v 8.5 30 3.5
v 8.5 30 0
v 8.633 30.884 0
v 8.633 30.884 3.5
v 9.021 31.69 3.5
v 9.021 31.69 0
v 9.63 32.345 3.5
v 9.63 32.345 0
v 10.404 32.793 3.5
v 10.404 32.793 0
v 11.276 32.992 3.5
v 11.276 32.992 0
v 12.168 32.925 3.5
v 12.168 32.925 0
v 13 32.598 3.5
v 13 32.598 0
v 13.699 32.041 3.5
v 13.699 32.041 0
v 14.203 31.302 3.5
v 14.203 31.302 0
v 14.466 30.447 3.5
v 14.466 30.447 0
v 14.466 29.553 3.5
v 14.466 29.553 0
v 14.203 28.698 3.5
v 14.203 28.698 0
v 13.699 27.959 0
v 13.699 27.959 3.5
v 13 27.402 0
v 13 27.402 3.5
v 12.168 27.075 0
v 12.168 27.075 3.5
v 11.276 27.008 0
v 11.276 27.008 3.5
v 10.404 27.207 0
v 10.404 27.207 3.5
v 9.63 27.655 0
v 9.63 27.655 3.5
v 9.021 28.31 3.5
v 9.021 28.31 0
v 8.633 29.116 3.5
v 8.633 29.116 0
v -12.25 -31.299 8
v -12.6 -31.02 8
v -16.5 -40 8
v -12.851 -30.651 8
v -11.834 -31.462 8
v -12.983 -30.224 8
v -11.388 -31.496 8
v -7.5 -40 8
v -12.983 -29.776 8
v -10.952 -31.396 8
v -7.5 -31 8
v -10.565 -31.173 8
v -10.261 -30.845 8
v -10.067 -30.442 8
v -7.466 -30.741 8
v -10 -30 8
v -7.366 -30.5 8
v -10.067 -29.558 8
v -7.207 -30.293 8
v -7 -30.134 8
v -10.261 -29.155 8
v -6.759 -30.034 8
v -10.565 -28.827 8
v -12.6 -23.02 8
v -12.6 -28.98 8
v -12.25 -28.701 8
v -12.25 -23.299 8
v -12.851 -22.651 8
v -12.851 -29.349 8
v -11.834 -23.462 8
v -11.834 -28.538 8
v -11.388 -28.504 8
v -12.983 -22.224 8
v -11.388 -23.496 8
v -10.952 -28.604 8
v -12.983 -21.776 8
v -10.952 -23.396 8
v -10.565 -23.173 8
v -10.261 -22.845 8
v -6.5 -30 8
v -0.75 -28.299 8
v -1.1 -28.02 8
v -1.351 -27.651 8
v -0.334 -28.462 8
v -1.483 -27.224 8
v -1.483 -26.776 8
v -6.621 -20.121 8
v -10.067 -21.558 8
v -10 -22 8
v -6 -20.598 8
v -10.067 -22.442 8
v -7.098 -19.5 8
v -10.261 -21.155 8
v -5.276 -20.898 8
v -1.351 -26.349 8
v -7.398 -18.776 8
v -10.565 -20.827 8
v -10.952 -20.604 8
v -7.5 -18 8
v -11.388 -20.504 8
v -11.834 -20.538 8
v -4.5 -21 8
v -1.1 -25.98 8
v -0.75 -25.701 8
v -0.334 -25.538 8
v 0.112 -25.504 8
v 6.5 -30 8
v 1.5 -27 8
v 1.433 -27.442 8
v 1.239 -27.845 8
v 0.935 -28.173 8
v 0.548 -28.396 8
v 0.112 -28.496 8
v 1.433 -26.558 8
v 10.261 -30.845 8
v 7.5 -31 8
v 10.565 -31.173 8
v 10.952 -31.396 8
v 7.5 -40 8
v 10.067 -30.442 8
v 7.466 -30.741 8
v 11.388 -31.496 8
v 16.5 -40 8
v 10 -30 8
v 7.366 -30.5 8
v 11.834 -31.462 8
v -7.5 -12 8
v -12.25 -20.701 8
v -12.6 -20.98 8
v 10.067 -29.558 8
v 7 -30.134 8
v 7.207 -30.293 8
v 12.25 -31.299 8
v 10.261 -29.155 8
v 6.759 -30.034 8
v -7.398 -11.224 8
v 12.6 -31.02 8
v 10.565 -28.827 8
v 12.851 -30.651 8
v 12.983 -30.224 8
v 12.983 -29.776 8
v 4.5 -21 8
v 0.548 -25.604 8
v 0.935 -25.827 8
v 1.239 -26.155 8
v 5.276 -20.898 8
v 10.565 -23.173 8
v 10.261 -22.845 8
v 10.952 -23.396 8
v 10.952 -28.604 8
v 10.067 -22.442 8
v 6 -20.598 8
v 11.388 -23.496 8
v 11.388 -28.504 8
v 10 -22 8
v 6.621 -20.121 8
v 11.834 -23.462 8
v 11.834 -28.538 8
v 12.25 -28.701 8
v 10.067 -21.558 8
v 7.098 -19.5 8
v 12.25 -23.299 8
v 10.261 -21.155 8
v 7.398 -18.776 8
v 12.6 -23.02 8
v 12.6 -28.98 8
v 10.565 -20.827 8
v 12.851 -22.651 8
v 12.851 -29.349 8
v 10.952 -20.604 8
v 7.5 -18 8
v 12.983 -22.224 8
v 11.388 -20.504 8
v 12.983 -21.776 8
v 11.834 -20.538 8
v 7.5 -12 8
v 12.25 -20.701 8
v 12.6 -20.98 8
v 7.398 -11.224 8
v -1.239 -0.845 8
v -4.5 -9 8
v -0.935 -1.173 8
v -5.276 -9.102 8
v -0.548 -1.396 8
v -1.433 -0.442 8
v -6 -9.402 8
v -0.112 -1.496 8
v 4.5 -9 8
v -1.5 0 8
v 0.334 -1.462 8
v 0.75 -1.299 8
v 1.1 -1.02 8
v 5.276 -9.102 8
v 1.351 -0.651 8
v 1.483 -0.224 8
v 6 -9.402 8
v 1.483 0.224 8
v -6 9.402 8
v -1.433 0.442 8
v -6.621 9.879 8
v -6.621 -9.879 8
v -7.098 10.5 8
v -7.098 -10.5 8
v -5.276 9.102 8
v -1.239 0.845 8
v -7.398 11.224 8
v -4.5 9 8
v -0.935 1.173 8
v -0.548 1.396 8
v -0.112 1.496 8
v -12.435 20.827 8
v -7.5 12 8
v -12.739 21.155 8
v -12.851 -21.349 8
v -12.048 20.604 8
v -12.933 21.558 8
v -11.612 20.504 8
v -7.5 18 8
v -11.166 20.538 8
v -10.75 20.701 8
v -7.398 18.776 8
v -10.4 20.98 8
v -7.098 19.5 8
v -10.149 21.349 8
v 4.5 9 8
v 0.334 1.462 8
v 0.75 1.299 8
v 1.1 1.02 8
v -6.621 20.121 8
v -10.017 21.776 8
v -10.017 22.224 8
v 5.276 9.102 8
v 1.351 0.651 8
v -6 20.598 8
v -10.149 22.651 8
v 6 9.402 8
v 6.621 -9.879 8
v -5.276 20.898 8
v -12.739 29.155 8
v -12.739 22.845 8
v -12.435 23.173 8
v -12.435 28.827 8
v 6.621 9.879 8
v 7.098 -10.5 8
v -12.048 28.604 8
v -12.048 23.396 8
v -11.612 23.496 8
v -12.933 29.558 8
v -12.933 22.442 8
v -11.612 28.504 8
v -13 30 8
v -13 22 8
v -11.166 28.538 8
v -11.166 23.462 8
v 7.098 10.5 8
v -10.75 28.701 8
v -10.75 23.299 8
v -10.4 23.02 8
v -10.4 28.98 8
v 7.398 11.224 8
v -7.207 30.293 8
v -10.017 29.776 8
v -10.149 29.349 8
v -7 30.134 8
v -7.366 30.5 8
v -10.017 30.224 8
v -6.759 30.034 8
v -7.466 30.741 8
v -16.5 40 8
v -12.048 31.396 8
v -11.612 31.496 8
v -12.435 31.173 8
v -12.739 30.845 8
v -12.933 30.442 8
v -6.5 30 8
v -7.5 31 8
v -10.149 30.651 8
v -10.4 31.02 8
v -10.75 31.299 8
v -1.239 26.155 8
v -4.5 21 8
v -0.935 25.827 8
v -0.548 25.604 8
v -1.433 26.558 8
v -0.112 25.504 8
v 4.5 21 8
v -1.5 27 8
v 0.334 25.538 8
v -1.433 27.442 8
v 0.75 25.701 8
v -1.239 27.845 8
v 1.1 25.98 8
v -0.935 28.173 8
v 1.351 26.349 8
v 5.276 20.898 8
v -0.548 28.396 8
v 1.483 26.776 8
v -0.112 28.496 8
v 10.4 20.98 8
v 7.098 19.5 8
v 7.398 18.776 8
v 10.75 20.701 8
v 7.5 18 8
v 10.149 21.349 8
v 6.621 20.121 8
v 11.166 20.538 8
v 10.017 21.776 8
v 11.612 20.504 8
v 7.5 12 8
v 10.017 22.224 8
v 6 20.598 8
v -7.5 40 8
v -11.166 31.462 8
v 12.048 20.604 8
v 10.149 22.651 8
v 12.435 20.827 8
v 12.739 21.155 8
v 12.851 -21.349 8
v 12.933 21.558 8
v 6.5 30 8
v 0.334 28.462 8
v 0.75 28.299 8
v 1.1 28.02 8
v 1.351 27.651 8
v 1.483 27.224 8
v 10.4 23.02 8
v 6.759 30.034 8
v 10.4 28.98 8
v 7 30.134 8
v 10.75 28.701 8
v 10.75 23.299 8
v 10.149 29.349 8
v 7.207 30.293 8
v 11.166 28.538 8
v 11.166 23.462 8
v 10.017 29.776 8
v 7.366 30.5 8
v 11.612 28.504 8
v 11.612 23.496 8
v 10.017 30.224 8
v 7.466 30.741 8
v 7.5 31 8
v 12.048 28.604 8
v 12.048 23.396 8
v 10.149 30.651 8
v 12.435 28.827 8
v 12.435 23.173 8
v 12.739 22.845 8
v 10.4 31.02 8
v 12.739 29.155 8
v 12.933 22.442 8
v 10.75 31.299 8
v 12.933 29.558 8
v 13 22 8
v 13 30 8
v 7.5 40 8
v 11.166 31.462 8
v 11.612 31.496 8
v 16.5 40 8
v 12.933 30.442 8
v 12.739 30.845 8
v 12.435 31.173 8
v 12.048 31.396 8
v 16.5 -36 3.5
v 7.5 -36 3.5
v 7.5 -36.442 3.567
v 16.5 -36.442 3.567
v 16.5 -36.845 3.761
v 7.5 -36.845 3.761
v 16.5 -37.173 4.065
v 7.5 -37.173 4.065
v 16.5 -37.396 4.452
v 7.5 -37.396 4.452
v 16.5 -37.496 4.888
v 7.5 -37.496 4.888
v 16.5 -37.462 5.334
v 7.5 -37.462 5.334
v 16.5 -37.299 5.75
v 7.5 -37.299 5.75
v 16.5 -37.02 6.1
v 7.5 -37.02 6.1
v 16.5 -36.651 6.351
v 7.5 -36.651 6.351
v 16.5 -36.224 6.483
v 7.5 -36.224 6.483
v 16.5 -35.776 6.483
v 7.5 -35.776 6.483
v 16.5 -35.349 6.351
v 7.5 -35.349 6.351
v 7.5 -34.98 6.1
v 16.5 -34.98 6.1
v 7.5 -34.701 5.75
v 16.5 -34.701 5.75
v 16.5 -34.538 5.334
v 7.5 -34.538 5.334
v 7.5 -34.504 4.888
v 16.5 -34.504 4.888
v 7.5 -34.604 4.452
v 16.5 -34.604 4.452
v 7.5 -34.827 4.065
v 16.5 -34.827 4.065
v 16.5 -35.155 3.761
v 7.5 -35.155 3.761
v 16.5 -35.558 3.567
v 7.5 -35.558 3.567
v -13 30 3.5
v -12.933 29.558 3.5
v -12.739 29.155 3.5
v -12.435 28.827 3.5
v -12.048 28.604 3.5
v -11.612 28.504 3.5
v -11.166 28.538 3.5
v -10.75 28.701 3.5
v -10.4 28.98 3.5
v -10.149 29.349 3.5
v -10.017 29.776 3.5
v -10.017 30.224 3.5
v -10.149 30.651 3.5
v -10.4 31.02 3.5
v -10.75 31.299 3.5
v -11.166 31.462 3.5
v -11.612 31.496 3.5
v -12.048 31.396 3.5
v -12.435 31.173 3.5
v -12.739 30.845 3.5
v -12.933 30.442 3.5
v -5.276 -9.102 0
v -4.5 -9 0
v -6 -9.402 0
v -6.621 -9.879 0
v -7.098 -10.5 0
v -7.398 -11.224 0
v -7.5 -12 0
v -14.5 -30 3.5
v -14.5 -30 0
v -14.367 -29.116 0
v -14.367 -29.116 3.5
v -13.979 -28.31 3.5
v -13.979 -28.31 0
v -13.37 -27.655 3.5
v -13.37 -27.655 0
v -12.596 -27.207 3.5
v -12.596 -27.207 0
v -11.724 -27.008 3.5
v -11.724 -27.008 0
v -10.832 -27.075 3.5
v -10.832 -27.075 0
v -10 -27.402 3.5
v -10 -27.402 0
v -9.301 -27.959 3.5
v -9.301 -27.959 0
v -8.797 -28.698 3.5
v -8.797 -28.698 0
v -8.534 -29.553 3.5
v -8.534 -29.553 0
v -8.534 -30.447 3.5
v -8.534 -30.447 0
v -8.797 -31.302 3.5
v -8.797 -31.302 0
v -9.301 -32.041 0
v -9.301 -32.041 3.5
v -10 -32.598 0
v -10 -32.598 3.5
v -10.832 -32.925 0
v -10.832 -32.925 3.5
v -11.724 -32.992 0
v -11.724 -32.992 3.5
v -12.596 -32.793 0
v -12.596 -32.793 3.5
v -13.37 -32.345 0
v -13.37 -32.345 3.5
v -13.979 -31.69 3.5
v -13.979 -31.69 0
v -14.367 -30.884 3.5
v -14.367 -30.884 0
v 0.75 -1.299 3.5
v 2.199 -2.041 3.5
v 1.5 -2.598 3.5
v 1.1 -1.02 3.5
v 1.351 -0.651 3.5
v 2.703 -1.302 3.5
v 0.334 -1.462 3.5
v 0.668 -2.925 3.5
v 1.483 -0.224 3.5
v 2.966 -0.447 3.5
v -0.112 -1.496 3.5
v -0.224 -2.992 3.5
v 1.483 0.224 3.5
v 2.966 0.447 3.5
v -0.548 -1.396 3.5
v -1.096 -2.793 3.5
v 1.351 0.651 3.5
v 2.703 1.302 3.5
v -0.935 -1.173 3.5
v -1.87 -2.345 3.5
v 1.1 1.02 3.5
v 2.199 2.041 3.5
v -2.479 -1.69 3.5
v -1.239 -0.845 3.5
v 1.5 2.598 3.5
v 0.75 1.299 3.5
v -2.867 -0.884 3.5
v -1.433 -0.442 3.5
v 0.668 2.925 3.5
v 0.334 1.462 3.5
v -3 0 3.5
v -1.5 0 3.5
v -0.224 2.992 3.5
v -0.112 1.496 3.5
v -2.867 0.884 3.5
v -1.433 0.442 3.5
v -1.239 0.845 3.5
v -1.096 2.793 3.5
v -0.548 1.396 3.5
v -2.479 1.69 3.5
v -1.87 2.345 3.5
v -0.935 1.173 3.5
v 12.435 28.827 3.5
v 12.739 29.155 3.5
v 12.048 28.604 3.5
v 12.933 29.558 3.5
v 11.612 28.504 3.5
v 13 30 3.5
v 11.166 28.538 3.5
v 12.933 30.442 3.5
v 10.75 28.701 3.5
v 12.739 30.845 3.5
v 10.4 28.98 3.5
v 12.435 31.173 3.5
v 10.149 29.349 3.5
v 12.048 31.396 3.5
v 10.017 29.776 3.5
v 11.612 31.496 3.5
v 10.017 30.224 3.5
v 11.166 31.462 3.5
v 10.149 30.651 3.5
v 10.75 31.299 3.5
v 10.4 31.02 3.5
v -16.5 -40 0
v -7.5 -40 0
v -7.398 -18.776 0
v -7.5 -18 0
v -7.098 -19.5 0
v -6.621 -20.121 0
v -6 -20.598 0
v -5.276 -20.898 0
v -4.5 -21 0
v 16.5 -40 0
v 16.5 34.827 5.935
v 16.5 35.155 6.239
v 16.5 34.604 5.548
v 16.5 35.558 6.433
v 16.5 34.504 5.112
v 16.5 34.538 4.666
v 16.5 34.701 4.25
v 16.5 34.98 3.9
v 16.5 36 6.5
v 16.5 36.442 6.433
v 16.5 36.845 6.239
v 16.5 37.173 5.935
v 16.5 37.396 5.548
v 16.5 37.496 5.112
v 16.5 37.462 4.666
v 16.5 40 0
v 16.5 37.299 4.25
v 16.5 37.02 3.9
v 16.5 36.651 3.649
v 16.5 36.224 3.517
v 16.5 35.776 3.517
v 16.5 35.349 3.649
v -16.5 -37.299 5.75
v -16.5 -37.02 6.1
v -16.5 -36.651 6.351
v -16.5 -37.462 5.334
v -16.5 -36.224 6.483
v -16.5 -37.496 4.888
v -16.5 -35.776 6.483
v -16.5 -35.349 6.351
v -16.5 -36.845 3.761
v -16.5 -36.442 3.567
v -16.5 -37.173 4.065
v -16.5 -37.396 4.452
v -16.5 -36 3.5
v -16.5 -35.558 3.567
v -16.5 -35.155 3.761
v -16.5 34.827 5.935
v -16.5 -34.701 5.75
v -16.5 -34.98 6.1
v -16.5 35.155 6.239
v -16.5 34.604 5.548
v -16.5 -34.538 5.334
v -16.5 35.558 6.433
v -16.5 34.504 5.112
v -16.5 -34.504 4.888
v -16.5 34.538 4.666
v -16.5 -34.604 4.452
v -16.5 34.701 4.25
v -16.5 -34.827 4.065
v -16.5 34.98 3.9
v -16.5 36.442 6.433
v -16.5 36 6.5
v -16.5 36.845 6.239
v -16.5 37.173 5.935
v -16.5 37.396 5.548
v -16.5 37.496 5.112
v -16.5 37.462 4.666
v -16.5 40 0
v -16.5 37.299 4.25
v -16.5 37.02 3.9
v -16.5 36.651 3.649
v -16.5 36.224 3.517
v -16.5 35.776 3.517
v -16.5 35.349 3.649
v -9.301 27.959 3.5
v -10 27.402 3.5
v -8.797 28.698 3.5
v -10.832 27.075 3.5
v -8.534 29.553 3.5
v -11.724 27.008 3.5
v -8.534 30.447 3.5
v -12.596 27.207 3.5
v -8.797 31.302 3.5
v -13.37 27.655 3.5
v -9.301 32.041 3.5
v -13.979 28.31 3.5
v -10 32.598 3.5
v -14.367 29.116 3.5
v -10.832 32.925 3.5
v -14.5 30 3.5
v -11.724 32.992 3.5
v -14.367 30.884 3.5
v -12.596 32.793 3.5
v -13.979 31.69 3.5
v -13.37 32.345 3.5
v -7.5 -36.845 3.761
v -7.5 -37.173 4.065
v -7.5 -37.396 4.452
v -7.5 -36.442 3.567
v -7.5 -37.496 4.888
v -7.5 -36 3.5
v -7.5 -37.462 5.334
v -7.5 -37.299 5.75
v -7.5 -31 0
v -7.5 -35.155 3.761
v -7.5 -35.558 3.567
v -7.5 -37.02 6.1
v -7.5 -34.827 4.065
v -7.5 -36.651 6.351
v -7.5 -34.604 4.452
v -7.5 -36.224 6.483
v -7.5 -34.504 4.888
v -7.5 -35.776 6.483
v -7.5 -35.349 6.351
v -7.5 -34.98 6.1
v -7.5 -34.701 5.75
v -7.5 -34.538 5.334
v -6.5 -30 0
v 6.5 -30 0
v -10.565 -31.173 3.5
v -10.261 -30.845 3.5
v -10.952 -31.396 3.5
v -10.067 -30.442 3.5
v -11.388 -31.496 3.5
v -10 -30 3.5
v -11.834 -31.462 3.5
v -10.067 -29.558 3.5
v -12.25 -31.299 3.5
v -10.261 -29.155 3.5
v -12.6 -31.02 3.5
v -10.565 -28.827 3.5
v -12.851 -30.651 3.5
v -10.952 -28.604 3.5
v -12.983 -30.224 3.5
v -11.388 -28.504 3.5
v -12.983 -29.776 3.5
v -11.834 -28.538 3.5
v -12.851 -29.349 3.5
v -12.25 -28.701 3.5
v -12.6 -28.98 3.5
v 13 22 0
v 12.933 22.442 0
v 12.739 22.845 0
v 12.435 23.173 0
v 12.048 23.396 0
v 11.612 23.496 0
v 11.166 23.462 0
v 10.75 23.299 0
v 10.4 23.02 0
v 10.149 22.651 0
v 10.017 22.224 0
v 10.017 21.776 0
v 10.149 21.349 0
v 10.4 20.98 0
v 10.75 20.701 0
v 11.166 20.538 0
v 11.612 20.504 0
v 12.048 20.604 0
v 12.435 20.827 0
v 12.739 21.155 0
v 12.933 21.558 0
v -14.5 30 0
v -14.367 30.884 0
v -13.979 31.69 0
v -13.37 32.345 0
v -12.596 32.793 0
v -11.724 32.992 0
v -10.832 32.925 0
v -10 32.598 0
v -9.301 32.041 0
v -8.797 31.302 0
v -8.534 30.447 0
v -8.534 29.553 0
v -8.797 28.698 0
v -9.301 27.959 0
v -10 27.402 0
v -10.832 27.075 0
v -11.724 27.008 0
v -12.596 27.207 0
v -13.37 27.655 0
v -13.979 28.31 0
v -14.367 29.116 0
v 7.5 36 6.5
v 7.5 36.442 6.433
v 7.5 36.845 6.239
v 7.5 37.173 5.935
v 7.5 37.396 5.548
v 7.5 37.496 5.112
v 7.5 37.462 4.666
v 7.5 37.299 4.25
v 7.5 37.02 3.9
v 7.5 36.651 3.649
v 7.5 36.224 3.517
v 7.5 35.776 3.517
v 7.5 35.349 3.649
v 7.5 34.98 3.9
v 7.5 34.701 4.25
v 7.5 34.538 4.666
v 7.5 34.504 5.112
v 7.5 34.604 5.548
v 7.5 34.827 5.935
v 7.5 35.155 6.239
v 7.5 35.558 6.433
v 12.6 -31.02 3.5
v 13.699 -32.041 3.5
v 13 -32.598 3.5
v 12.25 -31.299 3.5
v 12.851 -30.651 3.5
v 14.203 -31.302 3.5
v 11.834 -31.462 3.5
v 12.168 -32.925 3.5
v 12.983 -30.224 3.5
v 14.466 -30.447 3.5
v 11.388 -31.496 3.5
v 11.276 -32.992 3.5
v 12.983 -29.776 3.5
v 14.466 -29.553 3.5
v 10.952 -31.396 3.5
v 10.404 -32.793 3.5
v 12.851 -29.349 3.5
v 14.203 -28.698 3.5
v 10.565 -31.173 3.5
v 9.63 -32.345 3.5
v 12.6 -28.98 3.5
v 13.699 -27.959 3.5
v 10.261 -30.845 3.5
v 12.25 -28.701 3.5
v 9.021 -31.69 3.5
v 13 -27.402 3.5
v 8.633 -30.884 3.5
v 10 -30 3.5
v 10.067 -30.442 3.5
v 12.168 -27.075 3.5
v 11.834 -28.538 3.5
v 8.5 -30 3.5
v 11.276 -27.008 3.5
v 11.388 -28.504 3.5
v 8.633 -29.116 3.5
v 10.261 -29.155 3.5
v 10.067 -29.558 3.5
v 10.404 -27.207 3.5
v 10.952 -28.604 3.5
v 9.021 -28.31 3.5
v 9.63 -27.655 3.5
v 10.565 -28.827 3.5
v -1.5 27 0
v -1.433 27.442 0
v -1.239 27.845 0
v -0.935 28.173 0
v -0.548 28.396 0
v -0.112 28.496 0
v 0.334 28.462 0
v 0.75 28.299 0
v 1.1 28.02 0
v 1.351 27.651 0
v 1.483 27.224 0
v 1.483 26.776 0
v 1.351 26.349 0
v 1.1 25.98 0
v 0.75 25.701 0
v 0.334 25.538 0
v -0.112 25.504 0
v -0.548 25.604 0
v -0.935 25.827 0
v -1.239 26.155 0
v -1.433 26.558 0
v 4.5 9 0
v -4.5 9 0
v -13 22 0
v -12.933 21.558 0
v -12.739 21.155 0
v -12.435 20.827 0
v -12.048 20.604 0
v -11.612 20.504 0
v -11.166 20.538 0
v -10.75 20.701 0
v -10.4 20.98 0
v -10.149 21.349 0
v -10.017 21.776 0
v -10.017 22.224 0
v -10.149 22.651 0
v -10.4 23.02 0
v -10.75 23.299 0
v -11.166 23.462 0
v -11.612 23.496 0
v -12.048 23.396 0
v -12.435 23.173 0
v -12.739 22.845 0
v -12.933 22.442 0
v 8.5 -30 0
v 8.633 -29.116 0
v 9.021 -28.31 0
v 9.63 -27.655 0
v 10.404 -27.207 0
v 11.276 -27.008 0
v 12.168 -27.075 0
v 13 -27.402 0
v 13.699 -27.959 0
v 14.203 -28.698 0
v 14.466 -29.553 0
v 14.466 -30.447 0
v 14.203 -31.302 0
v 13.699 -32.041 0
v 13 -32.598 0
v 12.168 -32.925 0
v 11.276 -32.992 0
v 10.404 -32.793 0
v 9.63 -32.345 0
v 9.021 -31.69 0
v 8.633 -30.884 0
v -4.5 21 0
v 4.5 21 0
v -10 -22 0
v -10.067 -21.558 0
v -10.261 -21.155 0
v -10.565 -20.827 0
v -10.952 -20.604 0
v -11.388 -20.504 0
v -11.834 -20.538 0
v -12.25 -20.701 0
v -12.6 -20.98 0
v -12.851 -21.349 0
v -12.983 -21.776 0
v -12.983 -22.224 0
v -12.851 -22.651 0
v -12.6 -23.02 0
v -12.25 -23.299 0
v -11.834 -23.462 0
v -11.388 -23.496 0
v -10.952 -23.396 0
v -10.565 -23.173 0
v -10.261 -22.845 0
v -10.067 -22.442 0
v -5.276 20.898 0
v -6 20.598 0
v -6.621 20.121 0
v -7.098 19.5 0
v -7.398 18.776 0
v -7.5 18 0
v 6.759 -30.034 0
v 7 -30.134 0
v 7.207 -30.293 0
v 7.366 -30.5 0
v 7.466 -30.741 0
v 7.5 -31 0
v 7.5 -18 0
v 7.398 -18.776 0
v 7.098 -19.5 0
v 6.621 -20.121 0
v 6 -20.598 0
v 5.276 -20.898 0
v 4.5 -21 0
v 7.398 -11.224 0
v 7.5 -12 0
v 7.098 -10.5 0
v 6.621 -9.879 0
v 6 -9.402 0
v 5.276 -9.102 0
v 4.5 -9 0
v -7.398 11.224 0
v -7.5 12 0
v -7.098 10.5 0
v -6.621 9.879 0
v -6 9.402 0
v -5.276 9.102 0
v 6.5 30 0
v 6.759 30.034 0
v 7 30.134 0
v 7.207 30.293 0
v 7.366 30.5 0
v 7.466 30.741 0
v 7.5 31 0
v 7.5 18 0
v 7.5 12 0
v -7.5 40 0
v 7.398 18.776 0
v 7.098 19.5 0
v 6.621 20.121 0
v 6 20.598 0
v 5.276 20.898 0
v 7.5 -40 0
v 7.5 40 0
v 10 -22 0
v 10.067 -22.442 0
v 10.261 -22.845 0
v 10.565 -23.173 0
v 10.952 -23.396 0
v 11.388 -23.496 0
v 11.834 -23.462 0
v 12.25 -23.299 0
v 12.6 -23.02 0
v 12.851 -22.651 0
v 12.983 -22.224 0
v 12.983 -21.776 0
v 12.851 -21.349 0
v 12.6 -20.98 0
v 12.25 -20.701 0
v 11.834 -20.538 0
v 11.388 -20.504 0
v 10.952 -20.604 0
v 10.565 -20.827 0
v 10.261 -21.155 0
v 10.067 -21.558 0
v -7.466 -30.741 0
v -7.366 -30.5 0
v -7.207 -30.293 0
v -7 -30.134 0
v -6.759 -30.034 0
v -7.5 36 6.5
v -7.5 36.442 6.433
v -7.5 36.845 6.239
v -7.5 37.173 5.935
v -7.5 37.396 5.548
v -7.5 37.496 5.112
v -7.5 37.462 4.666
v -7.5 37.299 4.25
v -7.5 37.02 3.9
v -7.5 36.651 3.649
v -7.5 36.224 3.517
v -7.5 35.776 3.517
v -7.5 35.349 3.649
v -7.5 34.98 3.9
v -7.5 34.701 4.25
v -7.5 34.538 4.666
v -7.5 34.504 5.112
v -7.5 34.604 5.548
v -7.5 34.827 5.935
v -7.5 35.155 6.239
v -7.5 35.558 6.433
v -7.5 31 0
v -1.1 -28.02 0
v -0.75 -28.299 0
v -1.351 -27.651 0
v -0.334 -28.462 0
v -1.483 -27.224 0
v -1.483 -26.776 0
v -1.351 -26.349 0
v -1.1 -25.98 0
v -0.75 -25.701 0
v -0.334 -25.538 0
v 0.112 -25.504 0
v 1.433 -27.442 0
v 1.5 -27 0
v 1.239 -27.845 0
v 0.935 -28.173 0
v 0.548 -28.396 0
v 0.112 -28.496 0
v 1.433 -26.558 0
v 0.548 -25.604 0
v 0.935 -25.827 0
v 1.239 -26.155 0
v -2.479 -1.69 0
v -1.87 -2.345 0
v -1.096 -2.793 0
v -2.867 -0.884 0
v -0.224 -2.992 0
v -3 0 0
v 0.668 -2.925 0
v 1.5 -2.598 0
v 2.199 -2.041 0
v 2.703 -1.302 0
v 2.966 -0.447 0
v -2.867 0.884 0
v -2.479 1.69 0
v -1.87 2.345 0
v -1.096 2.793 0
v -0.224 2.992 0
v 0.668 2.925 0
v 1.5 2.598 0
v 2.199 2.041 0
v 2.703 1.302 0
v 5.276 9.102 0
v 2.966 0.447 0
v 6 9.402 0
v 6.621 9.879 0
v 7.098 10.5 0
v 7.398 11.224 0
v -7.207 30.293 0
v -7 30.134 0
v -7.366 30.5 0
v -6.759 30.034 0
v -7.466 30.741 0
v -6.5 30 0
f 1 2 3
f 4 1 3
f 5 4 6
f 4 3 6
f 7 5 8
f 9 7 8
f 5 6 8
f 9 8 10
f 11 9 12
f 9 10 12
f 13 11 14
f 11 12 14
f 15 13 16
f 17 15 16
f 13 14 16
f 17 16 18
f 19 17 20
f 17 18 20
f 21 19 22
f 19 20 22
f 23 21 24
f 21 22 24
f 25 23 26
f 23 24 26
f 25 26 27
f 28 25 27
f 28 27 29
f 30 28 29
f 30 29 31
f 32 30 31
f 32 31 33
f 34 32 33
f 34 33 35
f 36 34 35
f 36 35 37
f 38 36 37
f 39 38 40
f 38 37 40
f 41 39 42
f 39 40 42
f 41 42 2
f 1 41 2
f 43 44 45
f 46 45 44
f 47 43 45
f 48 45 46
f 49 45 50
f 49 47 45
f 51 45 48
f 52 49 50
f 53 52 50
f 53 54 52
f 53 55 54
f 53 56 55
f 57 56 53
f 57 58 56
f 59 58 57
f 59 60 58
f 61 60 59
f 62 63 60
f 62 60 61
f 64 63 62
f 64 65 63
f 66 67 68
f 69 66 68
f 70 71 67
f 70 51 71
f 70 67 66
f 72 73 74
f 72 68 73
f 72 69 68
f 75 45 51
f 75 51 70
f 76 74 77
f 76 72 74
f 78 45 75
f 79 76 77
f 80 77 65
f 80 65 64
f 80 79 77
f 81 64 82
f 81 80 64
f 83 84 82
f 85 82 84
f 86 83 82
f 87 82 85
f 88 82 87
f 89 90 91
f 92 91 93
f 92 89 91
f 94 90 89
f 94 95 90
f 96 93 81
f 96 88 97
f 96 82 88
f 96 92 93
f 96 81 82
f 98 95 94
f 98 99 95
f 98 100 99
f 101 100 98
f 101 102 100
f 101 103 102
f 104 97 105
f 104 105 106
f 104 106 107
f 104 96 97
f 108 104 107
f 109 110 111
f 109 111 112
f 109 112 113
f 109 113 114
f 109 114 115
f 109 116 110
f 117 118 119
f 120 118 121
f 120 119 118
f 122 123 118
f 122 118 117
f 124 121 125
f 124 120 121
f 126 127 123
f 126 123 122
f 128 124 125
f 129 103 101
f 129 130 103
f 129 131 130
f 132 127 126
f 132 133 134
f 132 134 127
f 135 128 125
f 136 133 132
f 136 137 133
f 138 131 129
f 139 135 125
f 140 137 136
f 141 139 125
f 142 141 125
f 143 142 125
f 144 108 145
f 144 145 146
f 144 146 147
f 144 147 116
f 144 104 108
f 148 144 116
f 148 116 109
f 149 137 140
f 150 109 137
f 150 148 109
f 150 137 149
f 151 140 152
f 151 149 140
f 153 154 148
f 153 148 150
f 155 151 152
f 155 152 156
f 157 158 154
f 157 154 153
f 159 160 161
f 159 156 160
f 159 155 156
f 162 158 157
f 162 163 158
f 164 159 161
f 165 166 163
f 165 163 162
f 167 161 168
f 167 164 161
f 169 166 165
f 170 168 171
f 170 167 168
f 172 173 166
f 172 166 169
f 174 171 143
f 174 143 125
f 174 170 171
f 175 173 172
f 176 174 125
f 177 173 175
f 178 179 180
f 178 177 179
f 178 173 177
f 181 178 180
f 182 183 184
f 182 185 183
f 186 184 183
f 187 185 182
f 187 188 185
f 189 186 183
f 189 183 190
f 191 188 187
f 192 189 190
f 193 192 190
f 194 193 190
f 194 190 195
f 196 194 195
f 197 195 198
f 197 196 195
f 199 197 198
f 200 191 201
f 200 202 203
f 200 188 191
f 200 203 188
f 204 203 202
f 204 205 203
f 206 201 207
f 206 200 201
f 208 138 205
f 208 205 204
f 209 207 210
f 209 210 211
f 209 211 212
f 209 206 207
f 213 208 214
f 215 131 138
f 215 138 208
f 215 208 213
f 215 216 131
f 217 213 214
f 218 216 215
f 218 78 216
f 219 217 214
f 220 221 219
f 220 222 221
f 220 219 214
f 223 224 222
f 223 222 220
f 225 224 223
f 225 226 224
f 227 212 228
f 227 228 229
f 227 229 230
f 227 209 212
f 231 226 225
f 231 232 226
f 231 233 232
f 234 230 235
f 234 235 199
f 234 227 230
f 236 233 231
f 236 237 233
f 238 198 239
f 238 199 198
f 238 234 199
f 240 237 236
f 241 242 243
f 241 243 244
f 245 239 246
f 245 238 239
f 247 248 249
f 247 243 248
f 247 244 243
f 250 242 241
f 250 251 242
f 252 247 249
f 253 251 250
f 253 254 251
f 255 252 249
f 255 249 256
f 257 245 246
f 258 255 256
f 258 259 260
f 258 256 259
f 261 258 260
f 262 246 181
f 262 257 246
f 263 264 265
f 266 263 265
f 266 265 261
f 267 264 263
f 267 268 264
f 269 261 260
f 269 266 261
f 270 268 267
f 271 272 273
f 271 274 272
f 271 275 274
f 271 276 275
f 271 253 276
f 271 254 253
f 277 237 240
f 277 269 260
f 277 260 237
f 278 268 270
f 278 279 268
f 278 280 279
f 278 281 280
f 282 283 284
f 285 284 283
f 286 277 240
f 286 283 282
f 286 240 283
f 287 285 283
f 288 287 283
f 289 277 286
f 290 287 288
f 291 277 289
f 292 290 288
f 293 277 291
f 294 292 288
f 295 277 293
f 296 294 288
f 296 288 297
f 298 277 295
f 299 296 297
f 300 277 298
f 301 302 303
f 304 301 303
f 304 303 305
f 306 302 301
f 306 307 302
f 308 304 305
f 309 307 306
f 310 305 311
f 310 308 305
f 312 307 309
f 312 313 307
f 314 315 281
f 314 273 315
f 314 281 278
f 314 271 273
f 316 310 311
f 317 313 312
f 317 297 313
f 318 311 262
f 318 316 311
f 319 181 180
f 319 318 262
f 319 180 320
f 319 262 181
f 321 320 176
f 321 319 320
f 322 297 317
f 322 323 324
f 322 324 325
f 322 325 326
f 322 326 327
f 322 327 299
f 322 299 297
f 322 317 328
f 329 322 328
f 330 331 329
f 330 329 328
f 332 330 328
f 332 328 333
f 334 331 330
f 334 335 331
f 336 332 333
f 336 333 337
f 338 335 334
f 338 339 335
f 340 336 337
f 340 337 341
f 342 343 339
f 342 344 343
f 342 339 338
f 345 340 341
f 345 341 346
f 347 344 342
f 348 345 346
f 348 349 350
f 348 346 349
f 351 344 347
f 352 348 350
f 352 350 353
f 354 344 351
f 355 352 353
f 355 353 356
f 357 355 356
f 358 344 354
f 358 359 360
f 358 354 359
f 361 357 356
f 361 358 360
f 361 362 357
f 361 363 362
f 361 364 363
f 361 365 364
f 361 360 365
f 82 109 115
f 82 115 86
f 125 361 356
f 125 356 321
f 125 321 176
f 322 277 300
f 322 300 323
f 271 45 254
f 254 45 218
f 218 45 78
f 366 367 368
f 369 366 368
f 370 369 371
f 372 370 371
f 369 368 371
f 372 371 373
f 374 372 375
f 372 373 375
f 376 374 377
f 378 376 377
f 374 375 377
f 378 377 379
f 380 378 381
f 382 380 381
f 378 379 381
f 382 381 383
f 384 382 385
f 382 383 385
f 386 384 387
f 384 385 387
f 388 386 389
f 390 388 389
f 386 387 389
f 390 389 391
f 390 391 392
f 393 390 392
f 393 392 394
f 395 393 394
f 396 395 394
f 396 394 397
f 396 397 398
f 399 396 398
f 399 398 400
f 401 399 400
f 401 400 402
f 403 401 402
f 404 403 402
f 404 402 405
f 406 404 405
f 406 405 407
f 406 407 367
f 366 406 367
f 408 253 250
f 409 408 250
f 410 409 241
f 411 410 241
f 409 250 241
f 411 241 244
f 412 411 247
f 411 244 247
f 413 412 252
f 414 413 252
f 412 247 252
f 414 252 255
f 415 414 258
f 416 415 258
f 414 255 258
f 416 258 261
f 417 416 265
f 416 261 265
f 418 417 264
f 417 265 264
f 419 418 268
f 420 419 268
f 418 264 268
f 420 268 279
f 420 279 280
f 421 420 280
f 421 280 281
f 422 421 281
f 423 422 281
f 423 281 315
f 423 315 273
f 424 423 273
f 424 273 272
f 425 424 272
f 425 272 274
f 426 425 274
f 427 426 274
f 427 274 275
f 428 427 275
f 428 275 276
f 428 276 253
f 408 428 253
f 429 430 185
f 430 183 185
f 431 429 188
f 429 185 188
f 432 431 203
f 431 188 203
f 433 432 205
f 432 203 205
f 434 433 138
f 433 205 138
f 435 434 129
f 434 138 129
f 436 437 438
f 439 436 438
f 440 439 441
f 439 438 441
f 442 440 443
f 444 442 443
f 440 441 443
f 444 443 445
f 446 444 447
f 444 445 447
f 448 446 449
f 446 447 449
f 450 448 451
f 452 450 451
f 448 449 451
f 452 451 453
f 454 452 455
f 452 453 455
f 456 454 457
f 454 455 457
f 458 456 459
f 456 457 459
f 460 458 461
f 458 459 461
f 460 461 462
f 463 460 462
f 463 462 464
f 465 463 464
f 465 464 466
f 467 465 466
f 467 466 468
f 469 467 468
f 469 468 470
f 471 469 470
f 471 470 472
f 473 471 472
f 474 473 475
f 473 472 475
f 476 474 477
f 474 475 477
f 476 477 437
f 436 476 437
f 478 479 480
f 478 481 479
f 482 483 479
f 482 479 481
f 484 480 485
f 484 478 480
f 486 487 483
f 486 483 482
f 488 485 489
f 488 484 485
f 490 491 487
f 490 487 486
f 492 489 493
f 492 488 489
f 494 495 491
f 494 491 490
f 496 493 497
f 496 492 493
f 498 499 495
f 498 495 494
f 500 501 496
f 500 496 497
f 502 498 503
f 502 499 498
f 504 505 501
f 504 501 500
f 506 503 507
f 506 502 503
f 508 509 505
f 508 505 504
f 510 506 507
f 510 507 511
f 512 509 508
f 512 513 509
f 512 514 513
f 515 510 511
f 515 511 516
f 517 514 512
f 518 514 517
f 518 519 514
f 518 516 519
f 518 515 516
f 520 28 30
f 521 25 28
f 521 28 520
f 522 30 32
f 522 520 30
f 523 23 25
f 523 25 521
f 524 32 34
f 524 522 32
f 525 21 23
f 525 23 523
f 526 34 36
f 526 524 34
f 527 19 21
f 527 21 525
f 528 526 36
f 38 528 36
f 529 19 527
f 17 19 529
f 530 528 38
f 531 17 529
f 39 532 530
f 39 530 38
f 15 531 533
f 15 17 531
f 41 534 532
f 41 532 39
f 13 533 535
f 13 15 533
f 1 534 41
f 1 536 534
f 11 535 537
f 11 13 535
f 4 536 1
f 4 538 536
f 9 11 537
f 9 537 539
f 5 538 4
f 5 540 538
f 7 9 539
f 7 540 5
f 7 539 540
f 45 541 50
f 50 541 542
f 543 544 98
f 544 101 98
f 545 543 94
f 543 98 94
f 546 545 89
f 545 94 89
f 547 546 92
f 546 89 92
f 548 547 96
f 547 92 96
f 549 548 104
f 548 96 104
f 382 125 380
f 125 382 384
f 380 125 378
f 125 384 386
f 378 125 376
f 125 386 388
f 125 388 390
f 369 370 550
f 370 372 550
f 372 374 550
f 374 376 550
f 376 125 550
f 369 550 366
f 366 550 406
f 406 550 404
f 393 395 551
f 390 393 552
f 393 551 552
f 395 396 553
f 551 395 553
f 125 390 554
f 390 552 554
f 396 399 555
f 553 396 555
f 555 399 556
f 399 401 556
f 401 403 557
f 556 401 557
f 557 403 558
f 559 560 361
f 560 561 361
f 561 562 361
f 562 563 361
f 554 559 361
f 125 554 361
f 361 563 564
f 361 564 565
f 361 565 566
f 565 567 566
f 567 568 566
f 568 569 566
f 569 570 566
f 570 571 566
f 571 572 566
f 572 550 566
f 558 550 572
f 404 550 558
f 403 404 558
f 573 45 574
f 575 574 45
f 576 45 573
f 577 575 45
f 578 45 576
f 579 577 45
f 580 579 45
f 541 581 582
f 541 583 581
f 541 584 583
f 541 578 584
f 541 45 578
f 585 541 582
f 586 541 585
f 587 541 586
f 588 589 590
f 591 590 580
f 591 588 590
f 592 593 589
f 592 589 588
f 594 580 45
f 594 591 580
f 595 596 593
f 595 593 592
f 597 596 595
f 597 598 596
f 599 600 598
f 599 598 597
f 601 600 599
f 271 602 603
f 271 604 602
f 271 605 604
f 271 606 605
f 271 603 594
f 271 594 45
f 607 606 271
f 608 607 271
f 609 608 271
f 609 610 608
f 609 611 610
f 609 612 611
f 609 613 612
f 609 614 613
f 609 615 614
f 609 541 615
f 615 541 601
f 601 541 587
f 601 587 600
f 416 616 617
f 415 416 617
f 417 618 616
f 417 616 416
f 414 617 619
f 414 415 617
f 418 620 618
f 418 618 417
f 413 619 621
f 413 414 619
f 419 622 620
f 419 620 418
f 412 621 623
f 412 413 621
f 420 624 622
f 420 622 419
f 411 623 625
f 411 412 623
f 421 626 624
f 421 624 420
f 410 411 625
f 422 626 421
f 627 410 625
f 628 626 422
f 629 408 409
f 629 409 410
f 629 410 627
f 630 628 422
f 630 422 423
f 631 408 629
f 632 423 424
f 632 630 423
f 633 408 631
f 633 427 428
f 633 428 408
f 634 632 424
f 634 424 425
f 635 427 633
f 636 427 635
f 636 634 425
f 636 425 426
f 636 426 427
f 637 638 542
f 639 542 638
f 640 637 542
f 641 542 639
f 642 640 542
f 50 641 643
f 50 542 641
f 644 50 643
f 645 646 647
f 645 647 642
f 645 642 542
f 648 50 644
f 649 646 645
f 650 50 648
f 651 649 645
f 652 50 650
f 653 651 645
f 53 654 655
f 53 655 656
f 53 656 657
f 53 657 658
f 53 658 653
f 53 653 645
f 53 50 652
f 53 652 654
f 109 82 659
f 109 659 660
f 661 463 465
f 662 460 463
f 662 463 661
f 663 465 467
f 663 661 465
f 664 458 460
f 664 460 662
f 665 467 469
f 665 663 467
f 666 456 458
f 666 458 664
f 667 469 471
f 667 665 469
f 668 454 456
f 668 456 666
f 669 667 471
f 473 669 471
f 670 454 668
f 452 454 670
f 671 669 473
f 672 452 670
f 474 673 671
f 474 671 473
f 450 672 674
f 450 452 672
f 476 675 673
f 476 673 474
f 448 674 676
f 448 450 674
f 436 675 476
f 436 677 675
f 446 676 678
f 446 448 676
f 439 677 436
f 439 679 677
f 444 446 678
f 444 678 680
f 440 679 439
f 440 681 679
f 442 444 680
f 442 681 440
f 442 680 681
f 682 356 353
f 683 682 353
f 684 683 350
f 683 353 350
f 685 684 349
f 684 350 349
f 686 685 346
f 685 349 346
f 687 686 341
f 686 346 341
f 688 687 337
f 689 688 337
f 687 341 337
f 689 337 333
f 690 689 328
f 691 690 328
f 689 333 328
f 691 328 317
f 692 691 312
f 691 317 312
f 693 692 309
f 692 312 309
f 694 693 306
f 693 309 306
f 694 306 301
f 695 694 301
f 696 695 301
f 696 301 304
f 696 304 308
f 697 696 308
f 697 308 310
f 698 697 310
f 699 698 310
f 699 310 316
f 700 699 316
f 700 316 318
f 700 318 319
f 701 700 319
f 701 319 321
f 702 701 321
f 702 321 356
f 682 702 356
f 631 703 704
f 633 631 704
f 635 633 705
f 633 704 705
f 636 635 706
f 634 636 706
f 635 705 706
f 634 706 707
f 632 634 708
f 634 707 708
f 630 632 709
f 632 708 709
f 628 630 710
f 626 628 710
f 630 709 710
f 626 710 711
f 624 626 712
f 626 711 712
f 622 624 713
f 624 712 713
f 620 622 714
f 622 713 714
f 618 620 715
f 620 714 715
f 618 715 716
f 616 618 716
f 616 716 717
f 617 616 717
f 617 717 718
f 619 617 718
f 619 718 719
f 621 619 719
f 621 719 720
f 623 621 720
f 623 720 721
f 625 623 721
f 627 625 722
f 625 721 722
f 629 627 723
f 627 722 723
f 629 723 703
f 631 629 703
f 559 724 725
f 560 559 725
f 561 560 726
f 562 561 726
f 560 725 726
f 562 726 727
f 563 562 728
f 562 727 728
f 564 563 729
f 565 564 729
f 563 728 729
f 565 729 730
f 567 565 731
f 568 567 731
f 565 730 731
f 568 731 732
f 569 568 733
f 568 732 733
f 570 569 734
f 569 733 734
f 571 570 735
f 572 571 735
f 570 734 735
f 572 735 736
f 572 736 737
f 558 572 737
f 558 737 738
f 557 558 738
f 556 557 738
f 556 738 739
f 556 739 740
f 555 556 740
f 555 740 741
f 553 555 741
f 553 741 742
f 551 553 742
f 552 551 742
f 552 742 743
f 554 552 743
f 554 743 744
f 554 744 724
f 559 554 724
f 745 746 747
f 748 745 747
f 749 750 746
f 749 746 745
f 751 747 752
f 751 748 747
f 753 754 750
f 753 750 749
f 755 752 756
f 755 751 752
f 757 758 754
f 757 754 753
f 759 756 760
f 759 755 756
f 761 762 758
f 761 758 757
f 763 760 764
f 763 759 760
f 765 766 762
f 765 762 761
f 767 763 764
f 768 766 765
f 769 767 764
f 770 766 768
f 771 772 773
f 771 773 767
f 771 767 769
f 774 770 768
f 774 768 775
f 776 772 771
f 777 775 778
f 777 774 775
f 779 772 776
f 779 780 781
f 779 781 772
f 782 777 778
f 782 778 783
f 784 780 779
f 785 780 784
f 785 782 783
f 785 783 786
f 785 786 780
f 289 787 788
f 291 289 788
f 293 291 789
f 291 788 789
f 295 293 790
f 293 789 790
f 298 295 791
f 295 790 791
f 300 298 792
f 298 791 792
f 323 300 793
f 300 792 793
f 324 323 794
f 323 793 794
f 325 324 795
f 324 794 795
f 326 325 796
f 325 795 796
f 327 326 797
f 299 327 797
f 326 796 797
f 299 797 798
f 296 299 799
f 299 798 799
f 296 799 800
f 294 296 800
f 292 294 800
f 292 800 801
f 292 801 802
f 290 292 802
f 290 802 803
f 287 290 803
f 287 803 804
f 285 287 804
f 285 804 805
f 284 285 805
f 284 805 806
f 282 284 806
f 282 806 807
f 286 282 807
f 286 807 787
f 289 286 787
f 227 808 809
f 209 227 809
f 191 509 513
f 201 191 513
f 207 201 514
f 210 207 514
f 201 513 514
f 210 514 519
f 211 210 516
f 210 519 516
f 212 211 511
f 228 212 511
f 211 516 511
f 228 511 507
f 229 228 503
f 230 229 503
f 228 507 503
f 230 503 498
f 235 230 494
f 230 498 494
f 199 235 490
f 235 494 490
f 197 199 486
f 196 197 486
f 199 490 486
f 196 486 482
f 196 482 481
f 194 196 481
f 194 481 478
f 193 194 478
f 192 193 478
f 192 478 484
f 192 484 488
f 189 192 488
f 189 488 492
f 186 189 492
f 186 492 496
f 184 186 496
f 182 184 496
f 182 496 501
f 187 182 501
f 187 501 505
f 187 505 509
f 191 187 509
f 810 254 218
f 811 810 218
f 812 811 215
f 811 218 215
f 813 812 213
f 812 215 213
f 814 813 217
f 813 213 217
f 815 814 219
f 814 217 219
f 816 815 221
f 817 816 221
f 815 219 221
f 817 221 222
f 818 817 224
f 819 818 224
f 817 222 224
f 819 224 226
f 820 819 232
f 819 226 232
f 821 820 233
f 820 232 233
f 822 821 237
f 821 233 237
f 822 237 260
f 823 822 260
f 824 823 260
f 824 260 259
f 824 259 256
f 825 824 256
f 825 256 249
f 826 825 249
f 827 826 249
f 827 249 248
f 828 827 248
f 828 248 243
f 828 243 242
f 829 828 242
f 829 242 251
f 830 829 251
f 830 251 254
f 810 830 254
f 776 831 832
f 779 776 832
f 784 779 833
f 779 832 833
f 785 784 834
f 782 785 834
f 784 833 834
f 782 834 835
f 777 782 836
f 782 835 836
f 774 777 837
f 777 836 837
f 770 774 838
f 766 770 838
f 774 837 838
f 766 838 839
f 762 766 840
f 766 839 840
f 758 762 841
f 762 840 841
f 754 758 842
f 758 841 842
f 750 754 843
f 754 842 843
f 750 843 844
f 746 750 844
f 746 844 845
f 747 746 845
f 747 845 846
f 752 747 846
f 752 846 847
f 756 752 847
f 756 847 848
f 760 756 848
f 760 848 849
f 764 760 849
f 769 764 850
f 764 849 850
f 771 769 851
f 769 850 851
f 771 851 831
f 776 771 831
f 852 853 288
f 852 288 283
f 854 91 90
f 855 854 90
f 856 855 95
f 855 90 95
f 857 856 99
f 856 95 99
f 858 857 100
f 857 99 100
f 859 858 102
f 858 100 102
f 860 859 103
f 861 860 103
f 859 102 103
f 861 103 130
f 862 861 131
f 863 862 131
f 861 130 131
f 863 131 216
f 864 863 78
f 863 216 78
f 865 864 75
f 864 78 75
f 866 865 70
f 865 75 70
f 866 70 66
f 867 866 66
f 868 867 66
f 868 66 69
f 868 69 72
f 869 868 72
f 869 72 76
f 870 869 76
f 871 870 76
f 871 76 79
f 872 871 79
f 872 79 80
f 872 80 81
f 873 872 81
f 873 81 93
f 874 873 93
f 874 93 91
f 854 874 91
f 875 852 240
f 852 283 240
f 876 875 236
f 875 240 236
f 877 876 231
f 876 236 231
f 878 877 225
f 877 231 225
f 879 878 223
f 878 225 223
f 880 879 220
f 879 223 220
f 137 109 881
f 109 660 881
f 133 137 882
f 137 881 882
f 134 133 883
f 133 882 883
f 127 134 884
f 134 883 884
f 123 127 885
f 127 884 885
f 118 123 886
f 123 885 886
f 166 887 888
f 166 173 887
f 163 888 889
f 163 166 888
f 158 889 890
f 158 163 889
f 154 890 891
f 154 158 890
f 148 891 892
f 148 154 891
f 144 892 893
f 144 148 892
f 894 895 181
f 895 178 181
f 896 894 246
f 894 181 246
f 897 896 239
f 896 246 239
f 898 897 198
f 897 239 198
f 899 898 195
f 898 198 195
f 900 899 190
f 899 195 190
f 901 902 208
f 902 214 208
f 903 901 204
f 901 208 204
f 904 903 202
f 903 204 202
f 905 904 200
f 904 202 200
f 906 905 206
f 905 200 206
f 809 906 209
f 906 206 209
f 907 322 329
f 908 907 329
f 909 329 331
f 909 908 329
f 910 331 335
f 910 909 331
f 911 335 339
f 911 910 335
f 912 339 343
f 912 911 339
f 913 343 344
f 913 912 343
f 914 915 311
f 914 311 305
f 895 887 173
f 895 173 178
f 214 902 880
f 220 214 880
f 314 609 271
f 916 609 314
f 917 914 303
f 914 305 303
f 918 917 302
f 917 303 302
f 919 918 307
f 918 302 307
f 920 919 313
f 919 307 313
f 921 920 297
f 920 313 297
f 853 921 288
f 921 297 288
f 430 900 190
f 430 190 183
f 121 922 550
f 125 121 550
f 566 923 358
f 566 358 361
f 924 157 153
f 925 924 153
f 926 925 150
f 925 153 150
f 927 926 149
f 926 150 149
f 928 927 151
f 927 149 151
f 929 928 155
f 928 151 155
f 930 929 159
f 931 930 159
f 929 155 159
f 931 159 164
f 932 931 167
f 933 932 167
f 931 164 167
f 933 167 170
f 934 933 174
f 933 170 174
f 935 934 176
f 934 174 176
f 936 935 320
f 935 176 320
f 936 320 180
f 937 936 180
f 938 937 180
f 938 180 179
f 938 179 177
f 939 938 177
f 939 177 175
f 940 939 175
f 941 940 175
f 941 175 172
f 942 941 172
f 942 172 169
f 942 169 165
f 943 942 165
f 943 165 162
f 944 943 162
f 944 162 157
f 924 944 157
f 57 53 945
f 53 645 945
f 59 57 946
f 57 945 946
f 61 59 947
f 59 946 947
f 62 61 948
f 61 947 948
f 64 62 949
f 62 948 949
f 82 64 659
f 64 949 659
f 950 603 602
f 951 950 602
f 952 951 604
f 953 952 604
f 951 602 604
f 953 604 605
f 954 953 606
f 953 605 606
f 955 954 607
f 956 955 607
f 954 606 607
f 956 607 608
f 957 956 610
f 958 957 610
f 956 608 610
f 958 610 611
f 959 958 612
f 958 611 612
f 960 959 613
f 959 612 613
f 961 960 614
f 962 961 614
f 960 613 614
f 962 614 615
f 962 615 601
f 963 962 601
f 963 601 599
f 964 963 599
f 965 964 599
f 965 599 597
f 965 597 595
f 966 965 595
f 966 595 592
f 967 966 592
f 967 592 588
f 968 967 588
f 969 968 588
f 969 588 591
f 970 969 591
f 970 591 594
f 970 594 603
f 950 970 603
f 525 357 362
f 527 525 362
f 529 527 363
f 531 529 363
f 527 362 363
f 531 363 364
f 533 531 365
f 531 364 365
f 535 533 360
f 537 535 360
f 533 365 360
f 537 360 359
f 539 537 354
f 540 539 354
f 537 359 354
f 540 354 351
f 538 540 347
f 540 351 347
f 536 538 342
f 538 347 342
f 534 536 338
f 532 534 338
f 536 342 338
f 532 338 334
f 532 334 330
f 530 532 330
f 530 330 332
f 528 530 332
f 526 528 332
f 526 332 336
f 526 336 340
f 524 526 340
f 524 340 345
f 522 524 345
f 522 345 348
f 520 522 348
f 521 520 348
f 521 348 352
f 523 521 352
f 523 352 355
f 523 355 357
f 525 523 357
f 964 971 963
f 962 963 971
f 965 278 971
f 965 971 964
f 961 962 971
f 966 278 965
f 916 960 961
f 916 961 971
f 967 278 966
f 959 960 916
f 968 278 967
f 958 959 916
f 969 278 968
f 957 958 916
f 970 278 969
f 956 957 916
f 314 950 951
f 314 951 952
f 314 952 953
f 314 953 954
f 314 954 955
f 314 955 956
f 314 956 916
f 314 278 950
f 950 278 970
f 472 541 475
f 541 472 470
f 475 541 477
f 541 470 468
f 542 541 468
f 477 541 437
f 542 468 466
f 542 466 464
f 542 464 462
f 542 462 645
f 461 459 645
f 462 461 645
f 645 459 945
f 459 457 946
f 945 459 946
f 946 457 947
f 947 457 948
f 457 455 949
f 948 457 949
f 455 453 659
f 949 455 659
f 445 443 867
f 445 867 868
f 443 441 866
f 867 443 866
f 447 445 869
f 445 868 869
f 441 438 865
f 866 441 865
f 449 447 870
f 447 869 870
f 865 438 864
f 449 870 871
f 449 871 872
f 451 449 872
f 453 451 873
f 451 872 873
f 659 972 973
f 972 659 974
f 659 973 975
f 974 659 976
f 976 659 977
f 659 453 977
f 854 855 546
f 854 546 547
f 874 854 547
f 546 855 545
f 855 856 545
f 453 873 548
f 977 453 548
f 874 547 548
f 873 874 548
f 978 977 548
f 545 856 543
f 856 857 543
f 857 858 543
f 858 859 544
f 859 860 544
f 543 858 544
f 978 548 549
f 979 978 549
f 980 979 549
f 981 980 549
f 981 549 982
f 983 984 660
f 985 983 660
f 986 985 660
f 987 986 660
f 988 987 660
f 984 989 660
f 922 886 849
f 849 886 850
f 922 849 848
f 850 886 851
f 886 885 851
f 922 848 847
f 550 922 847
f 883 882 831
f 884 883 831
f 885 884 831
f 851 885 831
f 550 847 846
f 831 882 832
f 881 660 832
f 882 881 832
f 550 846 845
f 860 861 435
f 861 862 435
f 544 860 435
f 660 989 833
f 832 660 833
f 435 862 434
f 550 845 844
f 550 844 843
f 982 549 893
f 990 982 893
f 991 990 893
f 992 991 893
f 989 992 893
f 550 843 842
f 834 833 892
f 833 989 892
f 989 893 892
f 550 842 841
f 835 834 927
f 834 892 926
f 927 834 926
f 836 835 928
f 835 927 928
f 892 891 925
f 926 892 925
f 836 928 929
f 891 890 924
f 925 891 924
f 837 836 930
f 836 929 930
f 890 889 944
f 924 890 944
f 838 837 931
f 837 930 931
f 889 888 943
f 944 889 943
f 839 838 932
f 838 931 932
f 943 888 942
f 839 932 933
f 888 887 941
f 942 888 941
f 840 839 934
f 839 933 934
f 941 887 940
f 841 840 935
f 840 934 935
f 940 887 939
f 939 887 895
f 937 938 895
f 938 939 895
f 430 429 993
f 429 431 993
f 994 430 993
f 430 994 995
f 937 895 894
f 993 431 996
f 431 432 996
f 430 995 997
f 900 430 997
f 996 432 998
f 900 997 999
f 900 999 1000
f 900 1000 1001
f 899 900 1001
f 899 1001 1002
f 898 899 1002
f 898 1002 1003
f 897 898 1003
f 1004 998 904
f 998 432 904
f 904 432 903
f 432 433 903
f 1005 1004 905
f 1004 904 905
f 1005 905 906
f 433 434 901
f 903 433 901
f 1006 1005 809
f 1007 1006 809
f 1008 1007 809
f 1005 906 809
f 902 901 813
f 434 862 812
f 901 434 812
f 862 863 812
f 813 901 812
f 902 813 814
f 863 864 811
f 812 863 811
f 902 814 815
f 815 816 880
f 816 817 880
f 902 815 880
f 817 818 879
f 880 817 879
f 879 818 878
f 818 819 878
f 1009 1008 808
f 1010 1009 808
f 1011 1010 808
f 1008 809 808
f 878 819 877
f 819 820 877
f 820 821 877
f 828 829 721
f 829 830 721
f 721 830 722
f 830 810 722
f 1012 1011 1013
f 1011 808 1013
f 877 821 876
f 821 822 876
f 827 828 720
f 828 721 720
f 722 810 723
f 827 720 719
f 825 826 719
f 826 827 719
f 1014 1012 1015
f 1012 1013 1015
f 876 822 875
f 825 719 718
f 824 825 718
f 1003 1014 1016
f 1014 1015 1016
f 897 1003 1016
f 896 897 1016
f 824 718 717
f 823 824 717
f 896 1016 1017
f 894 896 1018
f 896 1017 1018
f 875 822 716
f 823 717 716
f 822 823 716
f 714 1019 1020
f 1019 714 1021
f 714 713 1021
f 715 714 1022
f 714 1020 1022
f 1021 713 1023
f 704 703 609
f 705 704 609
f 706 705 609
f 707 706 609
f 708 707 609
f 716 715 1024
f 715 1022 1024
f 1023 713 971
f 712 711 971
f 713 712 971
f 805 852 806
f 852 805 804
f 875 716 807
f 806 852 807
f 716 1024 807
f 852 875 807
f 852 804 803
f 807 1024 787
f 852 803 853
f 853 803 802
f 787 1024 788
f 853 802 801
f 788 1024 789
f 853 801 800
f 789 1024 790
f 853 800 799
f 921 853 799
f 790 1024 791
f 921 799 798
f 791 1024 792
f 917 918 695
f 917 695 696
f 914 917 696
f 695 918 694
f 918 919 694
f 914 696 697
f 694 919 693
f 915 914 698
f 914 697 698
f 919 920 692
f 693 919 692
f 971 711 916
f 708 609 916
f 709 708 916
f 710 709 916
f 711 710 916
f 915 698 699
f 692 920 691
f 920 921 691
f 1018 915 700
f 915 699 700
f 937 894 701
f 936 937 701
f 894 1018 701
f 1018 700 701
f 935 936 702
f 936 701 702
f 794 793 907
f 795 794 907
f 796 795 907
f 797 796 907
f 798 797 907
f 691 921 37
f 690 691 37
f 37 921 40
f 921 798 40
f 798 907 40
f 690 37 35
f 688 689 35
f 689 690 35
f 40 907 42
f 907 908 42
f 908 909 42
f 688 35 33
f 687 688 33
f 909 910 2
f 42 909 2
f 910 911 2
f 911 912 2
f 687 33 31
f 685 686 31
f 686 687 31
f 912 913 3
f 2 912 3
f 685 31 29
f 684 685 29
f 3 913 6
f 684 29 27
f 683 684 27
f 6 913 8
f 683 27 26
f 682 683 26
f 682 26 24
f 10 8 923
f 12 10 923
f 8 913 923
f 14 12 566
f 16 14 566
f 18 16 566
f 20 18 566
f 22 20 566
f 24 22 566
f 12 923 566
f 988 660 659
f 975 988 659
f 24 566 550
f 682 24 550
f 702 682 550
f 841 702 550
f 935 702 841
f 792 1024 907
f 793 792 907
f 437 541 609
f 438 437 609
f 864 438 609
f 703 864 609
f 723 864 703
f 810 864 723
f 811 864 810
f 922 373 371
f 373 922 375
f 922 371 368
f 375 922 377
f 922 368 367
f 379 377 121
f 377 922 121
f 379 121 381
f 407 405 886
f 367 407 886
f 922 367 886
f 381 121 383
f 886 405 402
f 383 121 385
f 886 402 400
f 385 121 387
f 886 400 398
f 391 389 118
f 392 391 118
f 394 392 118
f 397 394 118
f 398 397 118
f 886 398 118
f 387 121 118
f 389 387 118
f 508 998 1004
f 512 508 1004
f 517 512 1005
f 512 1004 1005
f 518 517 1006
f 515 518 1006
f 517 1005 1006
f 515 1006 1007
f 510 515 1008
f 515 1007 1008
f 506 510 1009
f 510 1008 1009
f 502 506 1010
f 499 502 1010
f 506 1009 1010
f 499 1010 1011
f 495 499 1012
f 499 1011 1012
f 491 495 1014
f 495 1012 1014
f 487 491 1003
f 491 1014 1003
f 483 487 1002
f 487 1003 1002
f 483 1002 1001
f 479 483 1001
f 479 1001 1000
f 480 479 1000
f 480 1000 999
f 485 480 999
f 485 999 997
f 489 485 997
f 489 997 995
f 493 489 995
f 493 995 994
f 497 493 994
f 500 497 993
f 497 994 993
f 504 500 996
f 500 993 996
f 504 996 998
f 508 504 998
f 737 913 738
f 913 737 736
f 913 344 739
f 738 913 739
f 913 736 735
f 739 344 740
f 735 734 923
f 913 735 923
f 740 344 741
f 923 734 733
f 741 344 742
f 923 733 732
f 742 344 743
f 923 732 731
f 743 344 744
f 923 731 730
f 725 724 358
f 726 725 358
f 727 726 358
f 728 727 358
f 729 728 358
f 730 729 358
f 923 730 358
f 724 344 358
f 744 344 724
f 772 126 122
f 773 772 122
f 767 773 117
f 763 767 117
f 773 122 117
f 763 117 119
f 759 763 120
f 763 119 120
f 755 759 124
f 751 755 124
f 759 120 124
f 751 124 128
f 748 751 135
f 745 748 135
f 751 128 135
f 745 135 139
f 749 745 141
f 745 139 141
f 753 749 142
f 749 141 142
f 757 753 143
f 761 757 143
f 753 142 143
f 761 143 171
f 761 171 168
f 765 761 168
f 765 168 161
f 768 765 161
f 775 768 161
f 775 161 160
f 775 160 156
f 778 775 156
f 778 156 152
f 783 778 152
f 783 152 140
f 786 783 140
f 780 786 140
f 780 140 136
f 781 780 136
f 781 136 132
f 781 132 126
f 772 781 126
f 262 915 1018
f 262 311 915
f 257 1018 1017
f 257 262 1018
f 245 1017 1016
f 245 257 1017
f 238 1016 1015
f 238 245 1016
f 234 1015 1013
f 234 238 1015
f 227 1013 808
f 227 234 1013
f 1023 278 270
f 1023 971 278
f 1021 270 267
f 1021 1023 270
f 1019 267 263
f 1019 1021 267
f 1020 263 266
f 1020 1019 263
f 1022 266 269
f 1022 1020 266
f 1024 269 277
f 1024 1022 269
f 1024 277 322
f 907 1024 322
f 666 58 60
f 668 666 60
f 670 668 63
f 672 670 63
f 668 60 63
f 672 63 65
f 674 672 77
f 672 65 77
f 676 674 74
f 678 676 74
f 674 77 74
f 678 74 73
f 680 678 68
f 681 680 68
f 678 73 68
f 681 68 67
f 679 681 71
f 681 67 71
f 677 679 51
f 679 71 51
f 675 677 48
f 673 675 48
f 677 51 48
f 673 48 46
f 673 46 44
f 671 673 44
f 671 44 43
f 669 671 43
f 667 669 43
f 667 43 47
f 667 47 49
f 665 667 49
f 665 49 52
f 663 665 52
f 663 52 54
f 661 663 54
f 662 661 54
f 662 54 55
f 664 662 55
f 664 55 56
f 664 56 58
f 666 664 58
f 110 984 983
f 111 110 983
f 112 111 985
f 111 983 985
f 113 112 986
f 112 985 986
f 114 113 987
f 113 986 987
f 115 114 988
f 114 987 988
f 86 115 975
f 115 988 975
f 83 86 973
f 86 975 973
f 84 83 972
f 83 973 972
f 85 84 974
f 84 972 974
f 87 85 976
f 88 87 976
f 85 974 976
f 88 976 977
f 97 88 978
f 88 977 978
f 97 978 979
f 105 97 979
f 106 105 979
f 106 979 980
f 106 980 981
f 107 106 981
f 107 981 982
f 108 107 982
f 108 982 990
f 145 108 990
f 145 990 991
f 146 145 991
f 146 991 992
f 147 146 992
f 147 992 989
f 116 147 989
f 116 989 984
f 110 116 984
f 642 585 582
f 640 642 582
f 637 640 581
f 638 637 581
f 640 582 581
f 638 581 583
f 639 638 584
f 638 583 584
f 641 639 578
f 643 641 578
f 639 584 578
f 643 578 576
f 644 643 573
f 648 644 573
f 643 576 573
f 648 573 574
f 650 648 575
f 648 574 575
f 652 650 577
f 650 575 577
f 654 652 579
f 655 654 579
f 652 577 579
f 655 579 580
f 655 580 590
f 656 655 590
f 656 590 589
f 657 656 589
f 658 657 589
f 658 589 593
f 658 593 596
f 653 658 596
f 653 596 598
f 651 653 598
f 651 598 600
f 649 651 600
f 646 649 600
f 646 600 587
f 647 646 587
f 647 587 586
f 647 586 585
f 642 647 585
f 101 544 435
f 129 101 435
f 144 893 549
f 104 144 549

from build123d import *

# Parameters (mm, degrees)
SKETCH_1_W          = 33
SKETCH_1_H          = 80
EXTRUDE_1_DEPTH     = 8
SKETCH_2_W          = 15
SKETCH_2_H          = 10
CUT_EXTRUDE_1_DEPTH = 45.002840817
SKETCH_3_R          = 1.5
CUT_EXTRUDE_2_DEPTH = 45.002840817
SKETCH_4_R          = 1.5
CUT_EXTRUDE_3_DEPTH = 53.469038489
FILLET_2_R          = 1
SKETCH_5_R          = 1.5
CUT_EXTRUDE_4_DEPTH = 45.002840817
SKETCH_7_W          = 15
SKETCH_7_H          = 12
CUT_EXTRUDE_5_DEPTH = 45.002840817
FILLET_3_R          = 3
SKETCH_8_R          = 3
CUT_EXTRUDE_6_DEPTH = 3.5


with BuildPart() as part:
    # 草图1 → 凸台-拉伸1 (new body)
    with BuildSketch(Plane.XY):
        Rectangle(SKETCH_1_W, SKETCH_1_H)
    extrude(amount=EXTRUDE_1_DEPTH)

    # 草图2 → 切除-拉伸1 (cut, through all)
    with BuildSketch(Plane.XY.offset(8)):
        with Locations((0, 35)):
            Rectangle(SKETCH_2_W, SKETCH_2_H)
        with Locations((0, -35)):
            Rectangle(SKETCH_2_W, SKETCH_2_H)
    extrude(amount=-CUT_EXTRUDE_1_DEPTH, mode=Mode.SUBTRACT)

    # 草图3 → 切除-拉伸2 (cut, through all)
    with BuildSketch(Plane.XY.offset(8)):
        with Locations((11.5, 22)):
            Circle(SKETCH_3_R)
        with Locations((11.5, 30)):
            Circle(SKETCH_3_R)
        with Locations(Location((11.5, -30, 0), (0, 0, 180))):
            Circle(SKETCH_3_R)
        with Locations(Location((11.5, -22, 0), (0, 0, 180))):
            Circle(SKETCH_3_R)
        with Locations((-11.5, -22)):
            Circle(SKETCH_3_R)
        with Locations((-11.5, -30)):
            Circle(SKETCH_3_R)
        with Locations(Location((-11.5, 30, 0), (0, 0, 180))):
            Circle(SKETCH_3_R)
        with Locations(Location((-11.5, 22, 0), (0, 0, 180))):
            Circle(SKETCH_3_R)
    extrude(amount=-CUT_EXTRUDE_2_DEPTH, mode=Mode.SUBTRACT)

    # 草图4 → 切除-拉伸3 (cut, through all)
    with BuildSketch(Plane.ZY.offset(16.5)):
        with Locations((5, 36)):
            Circle(SKETCH_4_R)
        with Locations(Location((5, -36, 0), (0, 0, 180))):
            Circle(SKETCH_4_R)
    extrude(amount=-CUT_EXTRUDE_3_DEPTH, mode=Mode.SUBTRACT)

    # 圆角2
    fillet_2_edges = [part.edges().sort_by_distance(p)[0] for p in [
        (7.5, 30, 4),
        (-7.5, 30, 4),
        (-7.5, -30, 4),
        (7.5, -30, 4),
    ]]
    fillet(fillet_2_edges, radius=FILLET_2_R)

    # 草图5 → 切除-拉伸4 (cut, through all)
    with BuildSketch(Plane(origin=(0, 0, 0), x_dir=(-1, 0, 0), z_dir=(0, 0, -1))):
        Circle(SKETCH_5_R)
        with Locations((0, 27)):
            Circle(SKETCH_5_R)
        with Locations(Location((0, -27, 0), (0, 0, 180))):
            Circle(SKETCH_5_R)
    extrude(amount=-CUT_EXTRUDE_4_DEPTH, mode=Mode.SUBTRACT)

    # 草图7 → 切除-拉伸5 (cut, through all)
    with BuildSketch(Plane(origin=(0, 0, 0), x_dir=(-1, 0, 0), z_dir=(0, 0, -1))):
        with Locations((0, 15)):
            Rectangle(SKETCH_7_W, SKETCH_7_H)
        with Locations((0, -15)):
            Rectangle(SKETCH_7_W, SKETCH_7_H)
    extrude(amount=-CUT_EXTRUDE_5_DEPTH, mode=Mode.SUBTRACT)

    # 圆角3
    fillet_3_edges = [part.edges().sort_by_distance(p)[0] for p in [
        (-7.5, 21, 4),
        (-7.5, 9, 4),
        (7.5, 9, 4),
        (7.5, 21, 4),
        (7.5, -21, 4),
        (7.5, -9, 4),
        (-7.5, -9, 4),
        (-7.5, -21, 4),
    ]]
    fillet(fillet_3_edges, radius=FILLET_3_R)

    # 草图8 → 切除-拉伸6 (cut)
    with BuildSketch(Plane(origin=(0, 0, 0), x_dir=(-1, 0, 0), z_dir=(0, 0, -1))):
        with Locations((11.5, 30)):
            Circle(SKETCH_8_R)
        with Locations((-11.5, 30)):
            Circle(SKETCH_8_R)
        with Locations((-11.5, -30)):
            Circle(SKETCH_8_R)
        with Locations((11.5, -30)):
            Circle(SKETCH_8_R)
        Circle(SKETCH_8_R)
    extrude(amount=-CUT_EXTRUDE_6_DEPTH, mode=Mode.SUBTRACT)


solid = part.part
